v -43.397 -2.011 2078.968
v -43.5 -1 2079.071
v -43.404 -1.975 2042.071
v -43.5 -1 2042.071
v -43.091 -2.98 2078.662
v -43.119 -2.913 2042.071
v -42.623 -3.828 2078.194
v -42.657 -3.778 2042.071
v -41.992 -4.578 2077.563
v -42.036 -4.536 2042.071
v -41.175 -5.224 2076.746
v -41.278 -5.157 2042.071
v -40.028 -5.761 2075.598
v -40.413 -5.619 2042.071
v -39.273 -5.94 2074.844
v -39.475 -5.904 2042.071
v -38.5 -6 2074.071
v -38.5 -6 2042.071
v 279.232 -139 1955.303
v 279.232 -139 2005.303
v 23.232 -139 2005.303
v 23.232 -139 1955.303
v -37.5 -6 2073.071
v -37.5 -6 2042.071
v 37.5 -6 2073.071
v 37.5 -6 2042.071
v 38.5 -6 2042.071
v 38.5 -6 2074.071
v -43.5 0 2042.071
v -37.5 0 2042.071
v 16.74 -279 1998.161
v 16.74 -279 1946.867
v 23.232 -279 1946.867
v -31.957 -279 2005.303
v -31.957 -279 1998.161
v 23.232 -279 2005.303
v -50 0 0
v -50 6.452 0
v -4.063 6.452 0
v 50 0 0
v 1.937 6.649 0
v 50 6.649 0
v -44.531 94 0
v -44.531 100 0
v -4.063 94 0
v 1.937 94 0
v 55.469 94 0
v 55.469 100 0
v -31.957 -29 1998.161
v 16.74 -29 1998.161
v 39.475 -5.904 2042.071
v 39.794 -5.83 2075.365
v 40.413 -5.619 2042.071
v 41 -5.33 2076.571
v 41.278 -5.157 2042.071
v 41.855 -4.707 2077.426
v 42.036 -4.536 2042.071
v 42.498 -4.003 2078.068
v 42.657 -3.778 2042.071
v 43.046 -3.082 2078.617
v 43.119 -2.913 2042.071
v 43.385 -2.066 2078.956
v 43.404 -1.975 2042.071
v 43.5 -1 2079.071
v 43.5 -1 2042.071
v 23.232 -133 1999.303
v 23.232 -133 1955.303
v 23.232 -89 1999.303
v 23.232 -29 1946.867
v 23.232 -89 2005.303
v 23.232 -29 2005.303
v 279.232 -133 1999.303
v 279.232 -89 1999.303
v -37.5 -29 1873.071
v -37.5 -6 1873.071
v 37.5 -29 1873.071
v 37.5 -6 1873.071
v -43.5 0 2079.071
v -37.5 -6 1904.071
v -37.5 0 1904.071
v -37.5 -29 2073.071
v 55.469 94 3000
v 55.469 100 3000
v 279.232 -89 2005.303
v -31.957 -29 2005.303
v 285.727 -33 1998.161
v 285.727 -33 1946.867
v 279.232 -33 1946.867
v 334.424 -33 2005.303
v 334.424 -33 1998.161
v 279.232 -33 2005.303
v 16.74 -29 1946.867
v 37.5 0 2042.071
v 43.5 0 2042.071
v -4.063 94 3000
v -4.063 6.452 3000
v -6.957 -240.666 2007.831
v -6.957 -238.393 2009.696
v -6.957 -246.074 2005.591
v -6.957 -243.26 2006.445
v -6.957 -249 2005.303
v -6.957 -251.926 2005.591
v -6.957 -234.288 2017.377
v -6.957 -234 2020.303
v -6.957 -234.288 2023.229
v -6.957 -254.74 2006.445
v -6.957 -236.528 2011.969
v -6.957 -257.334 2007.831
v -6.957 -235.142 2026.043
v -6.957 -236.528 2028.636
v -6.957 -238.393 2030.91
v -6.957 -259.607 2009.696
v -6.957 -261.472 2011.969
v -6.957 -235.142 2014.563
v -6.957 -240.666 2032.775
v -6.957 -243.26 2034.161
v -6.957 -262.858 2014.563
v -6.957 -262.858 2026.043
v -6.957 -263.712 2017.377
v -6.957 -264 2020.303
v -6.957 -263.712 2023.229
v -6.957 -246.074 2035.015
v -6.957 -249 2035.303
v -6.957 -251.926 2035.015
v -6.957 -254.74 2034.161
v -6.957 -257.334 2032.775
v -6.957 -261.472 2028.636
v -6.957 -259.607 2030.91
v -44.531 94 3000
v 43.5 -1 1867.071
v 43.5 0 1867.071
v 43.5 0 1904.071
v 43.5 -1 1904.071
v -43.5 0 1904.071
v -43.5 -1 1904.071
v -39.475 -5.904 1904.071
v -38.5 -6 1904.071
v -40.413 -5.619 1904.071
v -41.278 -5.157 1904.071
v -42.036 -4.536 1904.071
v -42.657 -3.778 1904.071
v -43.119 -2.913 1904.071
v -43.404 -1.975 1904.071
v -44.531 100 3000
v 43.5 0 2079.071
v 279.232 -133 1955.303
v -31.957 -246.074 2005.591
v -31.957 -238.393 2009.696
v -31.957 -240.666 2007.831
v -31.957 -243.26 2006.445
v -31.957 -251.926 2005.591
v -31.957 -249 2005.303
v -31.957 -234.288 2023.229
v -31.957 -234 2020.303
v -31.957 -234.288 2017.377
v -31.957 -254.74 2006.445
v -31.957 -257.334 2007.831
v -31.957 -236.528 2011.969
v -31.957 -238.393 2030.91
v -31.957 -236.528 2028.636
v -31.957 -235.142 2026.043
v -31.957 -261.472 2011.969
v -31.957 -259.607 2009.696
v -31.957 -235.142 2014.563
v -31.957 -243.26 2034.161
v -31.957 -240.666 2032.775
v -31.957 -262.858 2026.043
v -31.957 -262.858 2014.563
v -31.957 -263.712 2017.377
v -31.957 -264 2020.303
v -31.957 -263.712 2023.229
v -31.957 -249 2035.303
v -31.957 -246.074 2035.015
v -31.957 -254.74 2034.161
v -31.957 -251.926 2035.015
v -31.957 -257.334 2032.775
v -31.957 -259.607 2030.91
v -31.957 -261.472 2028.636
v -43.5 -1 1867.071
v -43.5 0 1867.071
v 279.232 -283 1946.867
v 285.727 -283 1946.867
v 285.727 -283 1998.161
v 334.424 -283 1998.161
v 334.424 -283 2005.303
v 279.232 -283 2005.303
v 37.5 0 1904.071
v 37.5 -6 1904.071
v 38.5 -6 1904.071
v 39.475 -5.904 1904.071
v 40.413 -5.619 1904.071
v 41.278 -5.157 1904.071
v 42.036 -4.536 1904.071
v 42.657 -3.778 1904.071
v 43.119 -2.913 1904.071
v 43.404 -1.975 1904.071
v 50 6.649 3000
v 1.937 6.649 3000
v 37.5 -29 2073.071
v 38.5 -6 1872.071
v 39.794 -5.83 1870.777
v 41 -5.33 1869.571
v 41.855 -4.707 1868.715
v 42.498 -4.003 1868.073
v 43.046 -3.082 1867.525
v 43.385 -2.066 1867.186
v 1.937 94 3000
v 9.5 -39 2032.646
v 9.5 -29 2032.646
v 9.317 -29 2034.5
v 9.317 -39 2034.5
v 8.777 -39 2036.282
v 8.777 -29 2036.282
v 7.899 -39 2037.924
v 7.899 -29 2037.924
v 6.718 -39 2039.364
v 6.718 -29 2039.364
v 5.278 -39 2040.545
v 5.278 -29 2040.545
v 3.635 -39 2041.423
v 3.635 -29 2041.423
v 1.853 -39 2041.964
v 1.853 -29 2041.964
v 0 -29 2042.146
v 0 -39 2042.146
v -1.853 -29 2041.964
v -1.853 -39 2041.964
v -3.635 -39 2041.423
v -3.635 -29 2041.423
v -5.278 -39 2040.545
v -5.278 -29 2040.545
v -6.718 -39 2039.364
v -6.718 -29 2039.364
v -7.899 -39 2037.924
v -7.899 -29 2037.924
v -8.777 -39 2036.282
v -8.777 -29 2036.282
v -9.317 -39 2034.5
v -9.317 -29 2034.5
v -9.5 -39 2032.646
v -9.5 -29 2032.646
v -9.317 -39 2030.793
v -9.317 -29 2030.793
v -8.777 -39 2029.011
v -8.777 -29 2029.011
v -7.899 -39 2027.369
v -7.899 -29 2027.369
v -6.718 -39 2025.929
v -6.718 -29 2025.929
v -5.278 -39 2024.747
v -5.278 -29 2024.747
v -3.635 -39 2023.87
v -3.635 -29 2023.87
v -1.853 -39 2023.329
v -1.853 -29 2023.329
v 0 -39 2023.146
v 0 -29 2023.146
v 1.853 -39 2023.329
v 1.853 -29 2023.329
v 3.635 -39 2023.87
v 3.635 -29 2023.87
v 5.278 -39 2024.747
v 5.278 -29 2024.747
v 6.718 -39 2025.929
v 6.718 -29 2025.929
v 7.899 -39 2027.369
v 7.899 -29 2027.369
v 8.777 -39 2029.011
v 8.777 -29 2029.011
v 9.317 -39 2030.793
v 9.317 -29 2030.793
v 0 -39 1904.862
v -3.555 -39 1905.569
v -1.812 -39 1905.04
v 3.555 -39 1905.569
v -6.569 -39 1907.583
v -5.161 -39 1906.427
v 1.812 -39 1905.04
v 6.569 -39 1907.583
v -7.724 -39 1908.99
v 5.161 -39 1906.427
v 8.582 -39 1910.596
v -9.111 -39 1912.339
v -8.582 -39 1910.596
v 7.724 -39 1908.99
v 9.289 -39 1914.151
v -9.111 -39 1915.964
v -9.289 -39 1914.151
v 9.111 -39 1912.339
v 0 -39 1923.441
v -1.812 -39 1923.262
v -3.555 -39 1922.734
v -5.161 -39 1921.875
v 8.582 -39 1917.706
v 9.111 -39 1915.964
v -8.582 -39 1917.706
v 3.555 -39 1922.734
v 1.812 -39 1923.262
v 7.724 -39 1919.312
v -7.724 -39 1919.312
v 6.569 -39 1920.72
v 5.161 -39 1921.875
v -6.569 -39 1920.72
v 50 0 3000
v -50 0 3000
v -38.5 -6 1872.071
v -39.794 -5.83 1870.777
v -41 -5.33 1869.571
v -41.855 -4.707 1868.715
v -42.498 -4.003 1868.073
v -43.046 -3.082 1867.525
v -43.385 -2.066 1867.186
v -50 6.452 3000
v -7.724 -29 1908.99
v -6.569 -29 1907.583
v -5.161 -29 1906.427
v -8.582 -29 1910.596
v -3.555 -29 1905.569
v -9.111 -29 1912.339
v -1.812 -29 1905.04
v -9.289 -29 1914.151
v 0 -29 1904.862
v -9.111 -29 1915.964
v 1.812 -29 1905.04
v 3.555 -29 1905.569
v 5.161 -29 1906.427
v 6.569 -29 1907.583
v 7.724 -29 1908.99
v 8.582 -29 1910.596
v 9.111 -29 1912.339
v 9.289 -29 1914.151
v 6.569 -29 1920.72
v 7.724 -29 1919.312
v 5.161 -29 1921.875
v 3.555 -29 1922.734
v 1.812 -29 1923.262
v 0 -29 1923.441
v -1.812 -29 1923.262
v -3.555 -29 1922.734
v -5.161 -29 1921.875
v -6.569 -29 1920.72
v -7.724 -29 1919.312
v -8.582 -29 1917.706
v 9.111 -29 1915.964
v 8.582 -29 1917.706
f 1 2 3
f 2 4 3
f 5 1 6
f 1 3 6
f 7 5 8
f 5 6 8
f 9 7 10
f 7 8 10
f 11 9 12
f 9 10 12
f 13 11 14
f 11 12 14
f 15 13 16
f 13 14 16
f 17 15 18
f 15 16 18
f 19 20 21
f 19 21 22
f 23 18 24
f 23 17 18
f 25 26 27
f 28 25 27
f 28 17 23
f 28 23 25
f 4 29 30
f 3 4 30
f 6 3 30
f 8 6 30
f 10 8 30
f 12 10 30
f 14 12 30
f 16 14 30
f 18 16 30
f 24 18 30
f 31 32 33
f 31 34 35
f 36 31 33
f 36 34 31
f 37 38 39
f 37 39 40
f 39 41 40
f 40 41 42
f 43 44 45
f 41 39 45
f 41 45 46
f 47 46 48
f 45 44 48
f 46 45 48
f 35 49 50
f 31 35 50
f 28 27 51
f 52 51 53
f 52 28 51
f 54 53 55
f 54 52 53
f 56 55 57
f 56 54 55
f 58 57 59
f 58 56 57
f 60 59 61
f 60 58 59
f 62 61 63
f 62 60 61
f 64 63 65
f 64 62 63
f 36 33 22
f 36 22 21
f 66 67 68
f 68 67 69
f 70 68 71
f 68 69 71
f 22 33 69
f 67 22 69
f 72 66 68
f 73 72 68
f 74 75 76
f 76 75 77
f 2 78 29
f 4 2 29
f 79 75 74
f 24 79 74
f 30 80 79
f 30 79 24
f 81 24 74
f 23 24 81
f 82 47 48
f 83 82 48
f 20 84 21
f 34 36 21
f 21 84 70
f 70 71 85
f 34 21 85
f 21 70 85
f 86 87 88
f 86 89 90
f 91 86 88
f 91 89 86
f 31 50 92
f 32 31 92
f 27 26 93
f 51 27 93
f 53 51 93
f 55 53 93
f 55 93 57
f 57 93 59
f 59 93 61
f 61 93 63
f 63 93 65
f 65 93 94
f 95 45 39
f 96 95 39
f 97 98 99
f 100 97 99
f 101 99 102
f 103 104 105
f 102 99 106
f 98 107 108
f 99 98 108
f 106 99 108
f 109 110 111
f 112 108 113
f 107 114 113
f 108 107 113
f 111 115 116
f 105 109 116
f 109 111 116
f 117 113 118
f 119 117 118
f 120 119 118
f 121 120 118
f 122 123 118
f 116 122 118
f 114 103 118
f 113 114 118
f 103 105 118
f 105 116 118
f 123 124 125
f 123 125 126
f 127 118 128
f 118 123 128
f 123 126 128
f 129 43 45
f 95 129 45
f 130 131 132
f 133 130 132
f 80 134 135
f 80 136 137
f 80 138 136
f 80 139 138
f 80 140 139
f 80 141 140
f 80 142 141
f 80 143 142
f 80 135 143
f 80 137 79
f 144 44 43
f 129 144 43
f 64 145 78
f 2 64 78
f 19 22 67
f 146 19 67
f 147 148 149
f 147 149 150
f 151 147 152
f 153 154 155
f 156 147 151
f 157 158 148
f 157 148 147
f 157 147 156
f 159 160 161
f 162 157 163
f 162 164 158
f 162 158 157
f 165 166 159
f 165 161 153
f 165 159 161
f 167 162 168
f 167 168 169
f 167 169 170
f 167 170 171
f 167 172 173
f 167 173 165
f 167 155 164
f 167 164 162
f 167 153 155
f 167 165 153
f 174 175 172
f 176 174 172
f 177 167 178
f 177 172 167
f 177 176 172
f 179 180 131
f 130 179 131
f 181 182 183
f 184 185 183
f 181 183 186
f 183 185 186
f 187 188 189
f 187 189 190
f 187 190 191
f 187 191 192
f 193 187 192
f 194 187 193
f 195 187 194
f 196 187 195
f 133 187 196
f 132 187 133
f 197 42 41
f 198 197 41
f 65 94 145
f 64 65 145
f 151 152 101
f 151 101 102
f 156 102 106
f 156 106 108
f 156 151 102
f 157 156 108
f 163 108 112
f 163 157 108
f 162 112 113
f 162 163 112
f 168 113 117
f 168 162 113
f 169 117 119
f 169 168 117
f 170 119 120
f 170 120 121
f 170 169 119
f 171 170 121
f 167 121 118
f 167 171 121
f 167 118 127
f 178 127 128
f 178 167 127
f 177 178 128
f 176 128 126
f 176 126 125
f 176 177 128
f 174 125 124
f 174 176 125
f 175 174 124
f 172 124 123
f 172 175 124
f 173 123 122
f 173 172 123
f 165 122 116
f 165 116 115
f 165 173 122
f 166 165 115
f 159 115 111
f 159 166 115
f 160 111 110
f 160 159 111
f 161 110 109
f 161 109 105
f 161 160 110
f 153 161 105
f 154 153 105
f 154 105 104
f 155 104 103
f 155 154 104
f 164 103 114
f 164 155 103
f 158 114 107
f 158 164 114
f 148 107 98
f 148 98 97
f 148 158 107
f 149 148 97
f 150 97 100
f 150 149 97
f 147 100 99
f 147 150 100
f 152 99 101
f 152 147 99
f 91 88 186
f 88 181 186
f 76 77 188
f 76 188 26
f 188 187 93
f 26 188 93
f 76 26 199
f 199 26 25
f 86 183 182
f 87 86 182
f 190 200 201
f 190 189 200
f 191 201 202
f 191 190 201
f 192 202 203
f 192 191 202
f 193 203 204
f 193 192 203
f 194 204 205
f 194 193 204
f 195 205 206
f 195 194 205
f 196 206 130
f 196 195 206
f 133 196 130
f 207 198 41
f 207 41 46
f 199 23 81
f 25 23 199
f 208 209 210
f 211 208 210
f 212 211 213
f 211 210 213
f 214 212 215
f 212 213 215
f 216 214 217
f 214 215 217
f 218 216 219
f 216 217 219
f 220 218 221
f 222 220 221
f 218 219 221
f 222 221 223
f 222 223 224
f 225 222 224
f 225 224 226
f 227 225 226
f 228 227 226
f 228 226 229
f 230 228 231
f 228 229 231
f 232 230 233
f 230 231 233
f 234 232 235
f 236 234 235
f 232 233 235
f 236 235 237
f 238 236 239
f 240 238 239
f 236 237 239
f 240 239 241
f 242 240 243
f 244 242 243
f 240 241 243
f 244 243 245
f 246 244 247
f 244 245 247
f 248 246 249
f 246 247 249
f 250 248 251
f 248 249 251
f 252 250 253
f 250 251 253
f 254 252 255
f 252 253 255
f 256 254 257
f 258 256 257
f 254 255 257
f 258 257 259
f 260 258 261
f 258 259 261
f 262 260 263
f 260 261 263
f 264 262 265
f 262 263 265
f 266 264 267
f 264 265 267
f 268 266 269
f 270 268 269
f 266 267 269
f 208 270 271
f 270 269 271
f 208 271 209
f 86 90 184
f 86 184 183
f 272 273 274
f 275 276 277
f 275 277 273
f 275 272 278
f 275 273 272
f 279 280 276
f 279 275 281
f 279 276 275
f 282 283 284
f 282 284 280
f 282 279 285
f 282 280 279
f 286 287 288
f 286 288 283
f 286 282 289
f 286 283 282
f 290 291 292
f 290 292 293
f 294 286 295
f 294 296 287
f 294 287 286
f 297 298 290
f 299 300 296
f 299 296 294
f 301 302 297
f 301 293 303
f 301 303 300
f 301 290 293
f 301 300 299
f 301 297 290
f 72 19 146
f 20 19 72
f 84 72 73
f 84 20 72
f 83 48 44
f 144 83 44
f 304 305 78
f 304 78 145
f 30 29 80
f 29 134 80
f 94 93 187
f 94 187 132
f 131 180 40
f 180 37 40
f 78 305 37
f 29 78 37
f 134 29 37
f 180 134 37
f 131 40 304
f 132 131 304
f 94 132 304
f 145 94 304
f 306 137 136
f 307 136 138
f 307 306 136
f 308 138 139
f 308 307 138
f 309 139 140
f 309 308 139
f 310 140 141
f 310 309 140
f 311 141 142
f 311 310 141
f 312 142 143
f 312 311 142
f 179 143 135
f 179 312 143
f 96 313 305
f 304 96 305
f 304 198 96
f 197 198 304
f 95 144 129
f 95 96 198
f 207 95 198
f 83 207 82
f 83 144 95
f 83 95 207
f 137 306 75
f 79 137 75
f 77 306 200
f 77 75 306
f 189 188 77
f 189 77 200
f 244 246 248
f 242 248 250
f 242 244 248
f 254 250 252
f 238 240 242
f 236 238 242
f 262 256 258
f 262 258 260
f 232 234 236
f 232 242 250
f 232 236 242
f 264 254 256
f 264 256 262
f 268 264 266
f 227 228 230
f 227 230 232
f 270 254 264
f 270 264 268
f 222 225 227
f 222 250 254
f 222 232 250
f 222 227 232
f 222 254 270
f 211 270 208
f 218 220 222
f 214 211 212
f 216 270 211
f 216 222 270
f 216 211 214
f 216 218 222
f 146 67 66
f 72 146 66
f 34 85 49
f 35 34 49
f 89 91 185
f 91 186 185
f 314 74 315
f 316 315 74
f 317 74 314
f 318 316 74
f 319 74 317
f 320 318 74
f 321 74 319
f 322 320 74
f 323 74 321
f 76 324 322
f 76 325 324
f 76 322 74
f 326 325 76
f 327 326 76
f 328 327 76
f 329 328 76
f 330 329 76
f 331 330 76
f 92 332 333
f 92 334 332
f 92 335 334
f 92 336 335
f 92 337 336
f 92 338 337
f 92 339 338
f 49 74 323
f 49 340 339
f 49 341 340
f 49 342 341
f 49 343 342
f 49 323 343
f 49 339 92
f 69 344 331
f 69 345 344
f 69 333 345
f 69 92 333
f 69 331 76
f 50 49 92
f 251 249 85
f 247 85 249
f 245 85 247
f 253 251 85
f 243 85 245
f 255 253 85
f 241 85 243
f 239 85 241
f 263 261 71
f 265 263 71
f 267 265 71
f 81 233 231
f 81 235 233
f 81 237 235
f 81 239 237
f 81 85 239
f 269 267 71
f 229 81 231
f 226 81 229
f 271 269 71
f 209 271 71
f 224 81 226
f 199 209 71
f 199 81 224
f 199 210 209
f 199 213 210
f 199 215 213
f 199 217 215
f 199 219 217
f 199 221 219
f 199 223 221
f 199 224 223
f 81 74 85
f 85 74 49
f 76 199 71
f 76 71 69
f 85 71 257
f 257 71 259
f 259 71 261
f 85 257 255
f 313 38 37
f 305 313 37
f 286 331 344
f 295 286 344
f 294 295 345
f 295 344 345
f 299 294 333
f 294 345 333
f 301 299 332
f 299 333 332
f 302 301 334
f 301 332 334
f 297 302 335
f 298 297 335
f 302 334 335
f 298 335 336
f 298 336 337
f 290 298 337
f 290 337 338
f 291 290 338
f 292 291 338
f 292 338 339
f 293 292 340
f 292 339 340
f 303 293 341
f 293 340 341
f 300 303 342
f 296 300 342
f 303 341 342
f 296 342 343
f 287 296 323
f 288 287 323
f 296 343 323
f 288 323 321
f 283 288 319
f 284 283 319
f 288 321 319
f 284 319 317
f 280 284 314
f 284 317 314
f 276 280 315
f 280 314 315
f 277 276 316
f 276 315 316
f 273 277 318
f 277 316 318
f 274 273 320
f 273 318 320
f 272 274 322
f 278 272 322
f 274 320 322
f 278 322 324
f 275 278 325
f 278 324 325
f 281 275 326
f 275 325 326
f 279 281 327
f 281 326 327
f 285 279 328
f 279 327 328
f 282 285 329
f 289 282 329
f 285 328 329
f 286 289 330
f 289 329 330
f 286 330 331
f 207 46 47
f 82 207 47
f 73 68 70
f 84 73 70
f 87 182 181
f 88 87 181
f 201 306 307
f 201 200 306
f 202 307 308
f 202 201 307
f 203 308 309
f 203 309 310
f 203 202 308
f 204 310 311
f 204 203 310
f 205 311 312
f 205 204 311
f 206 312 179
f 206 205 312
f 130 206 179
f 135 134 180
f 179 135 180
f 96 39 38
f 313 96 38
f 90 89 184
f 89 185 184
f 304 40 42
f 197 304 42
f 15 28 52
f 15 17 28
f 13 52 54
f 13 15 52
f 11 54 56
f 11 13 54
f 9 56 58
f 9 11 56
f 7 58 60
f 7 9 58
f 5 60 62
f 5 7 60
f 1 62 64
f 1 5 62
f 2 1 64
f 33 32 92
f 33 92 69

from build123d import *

# Parameters (mm, degrees)
F1_DEPTH       = 3000
F2_W           = 75
F2_H           = 200
F3_DEPTH       = 20
F4_W           = 75
F4_H           = 200
F5_DEPTH       = 9
F6_R           = 9.5
F6_R_2         = 9.2893697212
F7_DEPTH       = 10
F9_DEPTH       = 250
F11_DEPTH      = 256
F13_DEPTH      = 150
F13_DEPTH_BACK = 100
F14_W          = 6
F14_H          = 31
F15_DEPTH      = 6
F16_R          = 5
F18_DEPTH      = 25


with BuildPart() as f1:
    # F0 (on Top) → F1 (new body)
    with BuildSketch(Plane.XY):
        Polygon((50, 6.6492896937), (1.9371941397, 6.6492896937), (1.9371941397, 94), (55.4691165686, 94), (55.4691165686, 100), (-44.5308834314, 100), (-44.5308834314, 94), (-4.0628058603, 94), (-4.0628058603, 6.4519625157), (-50, 6.4519625157), (-50, 0), (50, 0), align=None)
    extrude(amount=F1_DEPTH)

    # F2 (on face) → F3 (join)
    with BuildSketch(Plane.XZ):
        with Locations((0, 1973.070799336)):
            Rectangle(F2_W, F2_H)
    extrude(amount=F3_DEPTH)

    # F4 (on face) → F5 (join)
    with BuildSketch(Plane.XZ.offset(20)):
        with Locations((0, 1973.070799336)):
            Rectangle(F4_W, F4_H)
    extrude(amount=F5_DEPTH)

    # F6 (on face) → F7 (join)
    with BuildSketch(Plane.XZ.offset(29)):
        with Locations((0, 2032.6464176178)):
            Circle(F6_R)
        with Locations((0, 1914.1513109207)):
            Circle(F6_R_2)
    extrude(amount=F7_DEPTH)

    # F8 (on face) → F9 (join)
    with BuildSketch(Plane.XZ.offset(29)):
        Polygon((16.7395353317, 1946.8668699265), (23.2324238867, 1946.8668699265), (23.2324238867, 2005.3029060364), (-31.9571409374, 2005.3029060364), (-31.9571409374, 1998.1607198715), (16.7395353317, 1998.1607198715), align=None)
    extrude(amount=F9_DEPTH)

    # F10 (on face) → F11 (join)
    with BuildSketch(Plane.YZ.offset(23.2324238867)):
        Polygon((-139, 1955.3029060364), (-133, 1955.3029060364), (-133, 1999.3029060364), (-89, 1999.3029060364), (-89, 2005.3029060364), (-139, 2005.3029060364), align=None)
    extrude(amount=F11_DEPTH)

    # F14 (on face) → F15 (join)
    with BuildSketch(Plane.XZ):
        with Locations((-40.5, 2057.570799336)):
            Rectangle(F14_W, F14_H)
        Polygon((-43.5, 2073.070799336), (-37.5, 2073.070799336), (37.5, 2073.070799336), (43.5, 2073.070799336), (43.5, 2079.070799336), (-43.5, 2079.070799336), align=None)
        with Locations((40.5, 2057.570799336)):
            Rectangle(F14_W, F14_H)
        with Locations((40.5, 1888.570799336)):
            Rectangle(F14_W, F14_H)
        Polygon((-37.5, 1873.070799336), (-43.5, 1873.070799336), (-43.5, 1867.070799336), (43.5, 1867.070799336), (43.5, 1873.070799336), (37.5, 1873.070799336), align=None)
        with Locations((-40.5, 1888.570799336)):
            Rectangle(F14_W, F14_H)
    extrude(amount=F15_DEPTH)

    # F16
    f16_edges = [f1.edges().sort_by_distance(p)[0] for p in [
        (-43.5, -6, 2060.570799),
        (0, -6, 2079.070799),
        (43.5, -6, 2060.570799),
        (43.5, -6, 1885.570799),
        (0, -6, 1867.070799),
        (-43.5, -6, 1885.570799),
    ]]
    fillet(f16_edges, radius=F16_R)


with BuildPart() as f13:
    # F12 (on face) → F13 (new body, two sides)
    with BuildSketch(Plane(origin=(0, -133, 0), x_dir=(-1, 0, 0), z_dir=(0, 1, 0))) as f13_sk:
        Polygon((-285.7272495925, 1946.8668699265), (-279.2324238867, 1946.8668699265), (-279.2324238867, 2005.3029060364), (-334.4239258617, 2005.3029060364), (-334.4239258617, 1998.1607198715), (-285.7272495925, 1998.1607198715), align=None)
    extrude(amount=-F13_DEPTH)
    extrude(f13_sk.sketch, amount=F13_DEPTH_BACK)


with BuildPart() as f18:
    # F17 (on face) → F18 (new body)
    with BuildSketch(Plane(origin=(-31.9571409374, 0, 0), x_dir=(0, -1, 0), z_dir=(-1, 0, 0))):
        with BuildLine():
            ThreePointArc((264, 2020.3029060364), (238.3933982822, 2030.9095077542), (249, 2005.3029060364))
            ThreePointArc((249, 2005.3029060364), (259.6066017178, 2009.6963043186), (264, 2020.3029060364))
        make_face()
    extrude(amount=-F18_DEPTH)


solid = Compound([f1.part, f13.part, f18.part])
